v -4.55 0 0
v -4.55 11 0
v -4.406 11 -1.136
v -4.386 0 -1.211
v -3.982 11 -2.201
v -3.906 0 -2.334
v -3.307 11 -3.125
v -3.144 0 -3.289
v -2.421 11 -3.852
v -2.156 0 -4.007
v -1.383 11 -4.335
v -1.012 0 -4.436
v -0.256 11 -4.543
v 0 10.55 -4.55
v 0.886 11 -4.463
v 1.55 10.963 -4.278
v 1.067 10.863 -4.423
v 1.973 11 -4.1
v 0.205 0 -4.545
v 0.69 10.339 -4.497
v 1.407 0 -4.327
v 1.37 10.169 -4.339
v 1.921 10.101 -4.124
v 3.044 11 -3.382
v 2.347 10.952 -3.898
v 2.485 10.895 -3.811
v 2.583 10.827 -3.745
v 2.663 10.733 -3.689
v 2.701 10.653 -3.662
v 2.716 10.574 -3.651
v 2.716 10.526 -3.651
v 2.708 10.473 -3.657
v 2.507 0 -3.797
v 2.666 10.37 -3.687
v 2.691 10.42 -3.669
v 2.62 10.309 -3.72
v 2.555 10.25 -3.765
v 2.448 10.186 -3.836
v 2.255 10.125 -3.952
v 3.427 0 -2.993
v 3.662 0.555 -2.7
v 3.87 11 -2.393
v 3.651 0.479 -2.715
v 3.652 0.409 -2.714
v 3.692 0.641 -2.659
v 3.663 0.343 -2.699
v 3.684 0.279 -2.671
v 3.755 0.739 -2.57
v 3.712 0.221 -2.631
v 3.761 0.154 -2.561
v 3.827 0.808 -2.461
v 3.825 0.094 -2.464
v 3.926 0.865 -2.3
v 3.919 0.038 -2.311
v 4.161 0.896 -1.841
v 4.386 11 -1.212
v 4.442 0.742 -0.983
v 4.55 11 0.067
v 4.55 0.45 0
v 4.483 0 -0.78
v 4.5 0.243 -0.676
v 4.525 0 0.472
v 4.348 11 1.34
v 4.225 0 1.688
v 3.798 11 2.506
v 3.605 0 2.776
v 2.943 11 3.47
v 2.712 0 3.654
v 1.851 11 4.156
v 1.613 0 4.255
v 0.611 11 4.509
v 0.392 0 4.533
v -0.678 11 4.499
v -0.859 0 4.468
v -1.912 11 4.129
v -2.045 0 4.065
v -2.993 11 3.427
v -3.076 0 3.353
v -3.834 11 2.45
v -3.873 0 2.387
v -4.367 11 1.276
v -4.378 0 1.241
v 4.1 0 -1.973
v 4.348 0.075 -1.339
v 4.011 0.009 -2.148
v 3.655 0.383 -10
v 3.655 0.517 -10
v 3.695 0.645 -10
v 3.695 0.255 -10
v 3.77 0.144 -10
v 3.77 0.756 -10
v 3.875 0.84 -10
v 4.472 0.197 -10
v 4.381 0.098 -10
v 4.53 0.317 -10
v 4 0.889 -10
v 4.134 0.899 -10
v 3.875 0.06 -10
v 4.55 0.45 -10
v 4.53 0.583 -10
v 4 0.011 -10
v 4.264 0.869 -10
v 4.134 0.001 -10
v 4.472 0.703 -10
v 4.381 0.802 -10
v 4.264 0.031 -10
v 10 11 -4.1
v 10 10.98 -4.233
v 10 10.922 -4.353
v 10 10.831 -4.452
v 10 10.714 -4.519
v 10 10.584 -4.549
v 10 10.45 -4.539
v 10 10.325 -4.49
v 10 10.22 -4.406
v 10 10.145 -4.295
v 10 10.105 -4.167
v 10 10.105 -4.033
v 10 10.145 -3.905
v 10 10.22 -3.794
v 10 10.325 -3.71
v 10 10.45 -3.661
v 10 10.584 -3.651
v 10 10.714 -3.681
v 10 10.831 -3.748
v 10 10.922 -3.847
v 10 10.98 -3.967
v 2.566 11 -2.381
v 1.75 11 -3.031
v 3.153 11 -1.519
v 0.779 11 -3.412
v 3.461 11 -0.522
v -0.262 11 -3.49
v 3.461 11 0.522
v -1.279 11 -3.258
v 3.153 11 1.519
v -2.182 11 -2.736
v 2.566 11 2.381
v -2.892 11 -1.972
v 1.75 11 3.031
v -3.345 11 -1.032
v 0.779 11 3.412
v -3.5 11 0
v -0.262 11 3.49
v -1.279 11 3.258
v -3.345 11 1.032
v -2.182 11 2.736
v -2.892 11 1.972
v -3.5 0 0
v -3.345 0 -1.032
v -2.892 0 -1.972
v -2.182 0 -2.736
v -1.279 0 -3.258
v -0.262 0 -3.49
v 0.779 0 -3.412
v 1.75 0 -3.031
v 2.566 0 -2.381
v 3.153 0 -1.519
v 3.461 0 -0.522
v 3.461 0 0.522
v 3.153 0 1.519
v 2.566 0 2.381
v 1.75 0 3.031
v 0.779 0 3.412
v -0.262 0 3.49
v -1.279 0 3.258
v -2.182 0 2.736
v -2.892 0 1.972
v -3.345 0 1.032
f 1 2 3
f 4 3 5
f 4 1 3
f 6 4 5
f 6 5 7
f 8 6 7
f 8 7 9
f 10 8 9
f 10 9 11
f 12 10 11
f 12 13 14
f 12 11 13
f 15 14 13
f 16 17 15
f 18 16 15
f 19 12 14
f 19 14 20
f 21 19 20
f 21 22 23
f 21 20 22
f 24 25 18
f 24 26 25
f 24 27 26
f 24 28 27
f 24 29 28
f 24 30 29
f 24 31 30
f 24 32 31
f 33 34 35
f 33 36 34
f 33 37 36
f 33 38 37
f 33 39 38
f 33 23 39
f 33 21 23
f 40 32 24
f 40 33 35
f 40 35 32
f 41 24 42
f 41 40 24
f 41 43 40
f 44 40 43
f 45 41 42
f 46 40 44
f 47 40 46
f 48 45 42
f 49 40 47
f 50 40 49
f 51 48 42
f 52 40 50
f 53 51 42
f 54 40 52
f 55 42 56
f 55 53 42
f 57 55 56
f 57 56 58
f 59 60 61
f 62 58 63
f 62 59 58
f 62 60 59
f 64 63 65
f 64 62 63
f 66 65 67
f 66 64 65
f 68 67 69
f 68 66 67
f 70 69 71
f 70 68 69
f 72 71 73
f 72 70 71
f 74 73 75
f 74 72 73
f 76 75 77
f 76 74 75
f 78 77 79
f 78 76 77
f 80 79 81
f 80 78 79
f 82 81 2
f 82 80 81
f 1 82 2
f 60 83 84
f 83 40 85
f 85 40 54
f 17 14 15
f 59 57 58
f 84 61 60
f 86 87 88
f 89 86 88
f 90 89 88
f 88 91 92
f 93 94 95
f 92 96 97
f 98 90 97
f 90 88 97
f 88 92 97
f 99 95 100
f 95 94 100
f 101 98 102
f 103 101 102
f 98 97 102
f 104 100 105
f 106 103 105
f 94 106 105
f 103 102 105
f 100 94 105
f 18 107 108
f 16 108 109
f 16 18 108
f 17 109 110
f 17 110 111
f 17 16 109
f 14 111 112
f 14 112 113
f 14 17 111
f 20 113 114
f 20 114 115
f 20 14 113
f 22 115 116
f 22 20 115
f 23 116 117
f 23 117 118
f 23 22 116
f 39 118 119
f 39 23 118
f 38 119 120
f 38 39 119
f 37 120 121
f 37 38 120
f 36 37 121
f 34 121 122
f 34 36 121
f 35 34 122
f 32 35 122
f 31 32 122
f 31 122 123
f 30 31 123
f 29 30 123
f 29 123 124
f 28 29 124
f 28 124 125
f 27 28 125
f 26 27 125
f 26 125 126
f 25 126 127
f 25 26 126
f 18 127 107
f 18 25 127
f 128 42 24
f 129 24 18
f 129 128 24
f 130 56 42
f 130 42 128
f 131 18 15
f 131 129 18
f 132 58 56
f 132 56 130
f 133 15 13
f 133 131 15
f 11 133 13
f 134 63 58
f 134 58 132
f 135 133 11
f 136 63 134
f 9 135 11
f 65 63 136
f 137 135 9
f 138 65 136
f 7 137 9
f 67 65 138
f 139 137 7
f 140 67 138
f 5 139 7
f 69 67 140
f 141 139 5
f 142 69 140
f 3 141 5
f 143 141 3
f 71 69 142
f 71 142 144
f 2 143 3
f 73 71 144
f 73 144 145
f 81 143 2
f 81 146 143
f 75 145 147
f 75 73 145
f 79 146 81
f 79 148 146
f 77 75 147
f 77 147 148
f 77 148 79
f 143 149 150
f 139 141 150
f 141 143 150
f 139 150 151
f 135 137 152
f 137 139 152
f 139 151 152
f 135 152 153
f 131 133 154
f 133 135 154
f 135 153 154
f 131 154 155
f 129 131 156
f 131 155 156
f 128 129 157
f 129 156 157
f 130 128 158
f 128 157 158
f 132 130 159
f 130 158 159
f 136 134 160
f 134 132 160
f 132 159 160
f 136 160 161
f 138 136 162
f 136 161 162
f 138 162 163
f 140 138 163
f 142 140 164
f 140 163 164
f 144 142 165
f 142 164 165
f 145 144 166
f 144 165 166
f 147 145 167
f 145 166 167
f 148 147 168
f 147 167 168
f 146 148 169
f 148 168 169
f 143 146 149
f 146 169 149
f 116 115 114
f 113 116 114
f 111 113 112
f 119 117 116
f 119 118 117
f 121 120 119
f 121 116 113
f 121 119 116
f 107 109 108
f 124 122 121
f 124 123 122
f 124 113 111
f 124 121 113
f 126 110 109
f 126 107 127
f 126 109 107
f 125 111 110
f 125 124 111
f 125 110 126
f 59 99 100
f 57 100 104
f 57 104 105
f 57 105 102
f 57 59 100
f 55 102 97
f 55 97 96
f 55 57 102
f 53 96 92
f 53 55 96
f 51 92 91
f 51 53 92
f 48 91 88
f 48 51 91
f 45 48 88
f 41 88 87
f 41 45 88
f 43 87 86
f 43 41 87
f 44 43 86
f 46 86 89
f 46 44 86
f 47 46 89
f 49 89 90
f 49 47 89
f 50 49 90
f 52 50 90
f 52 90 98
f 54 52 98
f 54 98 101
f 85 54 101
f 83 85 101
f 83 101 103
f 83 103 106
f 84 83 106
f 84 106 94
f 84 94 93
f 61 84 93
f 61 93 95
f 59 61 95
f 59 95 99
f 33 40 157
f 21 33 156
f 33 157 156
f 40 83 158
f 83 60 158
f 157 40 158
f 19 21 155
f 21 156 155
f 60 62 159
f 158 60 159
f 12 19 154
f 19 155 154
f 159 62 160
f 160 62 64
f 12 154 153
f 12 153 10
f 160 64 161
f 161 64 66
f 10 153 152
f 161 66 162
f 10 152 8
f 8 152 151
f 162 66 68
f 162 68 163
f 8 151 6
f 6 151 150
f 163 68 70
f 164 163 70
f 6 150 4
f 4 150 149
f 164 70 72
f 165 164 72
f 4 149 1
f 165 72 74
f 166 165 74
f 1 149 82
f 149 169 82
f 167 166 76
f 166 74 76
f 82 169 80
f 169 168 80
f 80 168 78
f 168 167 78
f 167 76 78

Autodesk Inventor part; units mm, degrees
ref_plane "YZ Plane" through (0, 0, 0) normal (1, 0, 0) x (0, 1, 0)
ref_plane "XZ Plane" through (0, 0, 0) normal (0, 1, 0) x (-1, 0, 0)
ref_plane "XY Plane" through (0, 0, 0) normal (0, 0, 1) x (1, 0, 0)
sketch "Sketch1" plane through (0, 0, 0) normal (0, 1, 0) x (-1, 0, 0)
  circle A0 centre (0, 0) radius 4.55
  circle A1 centre (0, 0) radius 3.5
  dimension "d0" = 9.1
  dimension "d1" = 7
extrude "Extrusion1" add sketch "Sketch1" along normal blind 11
sketch "Sketch2" plane through (0, 0, 0) normal (0, 0, 1) x (1, 0, 0)
  line L0 (4.55, 11) -> (-4.55, 11) projected
  line L1 (4.55, 0) -> (-4.55, 0) projected
  line L2 (4.55, 0) -> (-4.55, 0) projected
  line L3 (4.55, 0) -> (4.55, 11) projected
  line L4 (-4.55, 0) -> (-4.55, 11) projected
  circle A0 centre (4.1, 0.45) radius 0.45
  point P0 (0, 0)
  dimension "d11" = 0.9
extrude "Extrusion2" add sketch "Sketch2" against normal blind 10 contours A0
sketch "Sketch3" plane through (0, 0, 0) normal (1, 0, 0) x (0, 1, 0)
  line L0 (0, -4.55) -> (0, 4.55) projected
  line L1 (11, -4.55) -> (11, 4.55) projected
  line L2 (11, -4.55) -> (11, 4.55) projected
  line L3 (0, 4.55) -> (11, 4.55) projected
  line L4 (0, -4.55) -> (11, -4.55) projected
  circle A0 centre (10.55, -4.1) radius 0.45
  point P0 (0, 0)
  point P1 (0, -1.9729)
  point P2 (0.45, 0)
  dimension "d12" = 0.9
extrude "Extrusion3" add sketch "Sketch3" along normal blind 10 contours A0
properties part number "Torsion_spring"
